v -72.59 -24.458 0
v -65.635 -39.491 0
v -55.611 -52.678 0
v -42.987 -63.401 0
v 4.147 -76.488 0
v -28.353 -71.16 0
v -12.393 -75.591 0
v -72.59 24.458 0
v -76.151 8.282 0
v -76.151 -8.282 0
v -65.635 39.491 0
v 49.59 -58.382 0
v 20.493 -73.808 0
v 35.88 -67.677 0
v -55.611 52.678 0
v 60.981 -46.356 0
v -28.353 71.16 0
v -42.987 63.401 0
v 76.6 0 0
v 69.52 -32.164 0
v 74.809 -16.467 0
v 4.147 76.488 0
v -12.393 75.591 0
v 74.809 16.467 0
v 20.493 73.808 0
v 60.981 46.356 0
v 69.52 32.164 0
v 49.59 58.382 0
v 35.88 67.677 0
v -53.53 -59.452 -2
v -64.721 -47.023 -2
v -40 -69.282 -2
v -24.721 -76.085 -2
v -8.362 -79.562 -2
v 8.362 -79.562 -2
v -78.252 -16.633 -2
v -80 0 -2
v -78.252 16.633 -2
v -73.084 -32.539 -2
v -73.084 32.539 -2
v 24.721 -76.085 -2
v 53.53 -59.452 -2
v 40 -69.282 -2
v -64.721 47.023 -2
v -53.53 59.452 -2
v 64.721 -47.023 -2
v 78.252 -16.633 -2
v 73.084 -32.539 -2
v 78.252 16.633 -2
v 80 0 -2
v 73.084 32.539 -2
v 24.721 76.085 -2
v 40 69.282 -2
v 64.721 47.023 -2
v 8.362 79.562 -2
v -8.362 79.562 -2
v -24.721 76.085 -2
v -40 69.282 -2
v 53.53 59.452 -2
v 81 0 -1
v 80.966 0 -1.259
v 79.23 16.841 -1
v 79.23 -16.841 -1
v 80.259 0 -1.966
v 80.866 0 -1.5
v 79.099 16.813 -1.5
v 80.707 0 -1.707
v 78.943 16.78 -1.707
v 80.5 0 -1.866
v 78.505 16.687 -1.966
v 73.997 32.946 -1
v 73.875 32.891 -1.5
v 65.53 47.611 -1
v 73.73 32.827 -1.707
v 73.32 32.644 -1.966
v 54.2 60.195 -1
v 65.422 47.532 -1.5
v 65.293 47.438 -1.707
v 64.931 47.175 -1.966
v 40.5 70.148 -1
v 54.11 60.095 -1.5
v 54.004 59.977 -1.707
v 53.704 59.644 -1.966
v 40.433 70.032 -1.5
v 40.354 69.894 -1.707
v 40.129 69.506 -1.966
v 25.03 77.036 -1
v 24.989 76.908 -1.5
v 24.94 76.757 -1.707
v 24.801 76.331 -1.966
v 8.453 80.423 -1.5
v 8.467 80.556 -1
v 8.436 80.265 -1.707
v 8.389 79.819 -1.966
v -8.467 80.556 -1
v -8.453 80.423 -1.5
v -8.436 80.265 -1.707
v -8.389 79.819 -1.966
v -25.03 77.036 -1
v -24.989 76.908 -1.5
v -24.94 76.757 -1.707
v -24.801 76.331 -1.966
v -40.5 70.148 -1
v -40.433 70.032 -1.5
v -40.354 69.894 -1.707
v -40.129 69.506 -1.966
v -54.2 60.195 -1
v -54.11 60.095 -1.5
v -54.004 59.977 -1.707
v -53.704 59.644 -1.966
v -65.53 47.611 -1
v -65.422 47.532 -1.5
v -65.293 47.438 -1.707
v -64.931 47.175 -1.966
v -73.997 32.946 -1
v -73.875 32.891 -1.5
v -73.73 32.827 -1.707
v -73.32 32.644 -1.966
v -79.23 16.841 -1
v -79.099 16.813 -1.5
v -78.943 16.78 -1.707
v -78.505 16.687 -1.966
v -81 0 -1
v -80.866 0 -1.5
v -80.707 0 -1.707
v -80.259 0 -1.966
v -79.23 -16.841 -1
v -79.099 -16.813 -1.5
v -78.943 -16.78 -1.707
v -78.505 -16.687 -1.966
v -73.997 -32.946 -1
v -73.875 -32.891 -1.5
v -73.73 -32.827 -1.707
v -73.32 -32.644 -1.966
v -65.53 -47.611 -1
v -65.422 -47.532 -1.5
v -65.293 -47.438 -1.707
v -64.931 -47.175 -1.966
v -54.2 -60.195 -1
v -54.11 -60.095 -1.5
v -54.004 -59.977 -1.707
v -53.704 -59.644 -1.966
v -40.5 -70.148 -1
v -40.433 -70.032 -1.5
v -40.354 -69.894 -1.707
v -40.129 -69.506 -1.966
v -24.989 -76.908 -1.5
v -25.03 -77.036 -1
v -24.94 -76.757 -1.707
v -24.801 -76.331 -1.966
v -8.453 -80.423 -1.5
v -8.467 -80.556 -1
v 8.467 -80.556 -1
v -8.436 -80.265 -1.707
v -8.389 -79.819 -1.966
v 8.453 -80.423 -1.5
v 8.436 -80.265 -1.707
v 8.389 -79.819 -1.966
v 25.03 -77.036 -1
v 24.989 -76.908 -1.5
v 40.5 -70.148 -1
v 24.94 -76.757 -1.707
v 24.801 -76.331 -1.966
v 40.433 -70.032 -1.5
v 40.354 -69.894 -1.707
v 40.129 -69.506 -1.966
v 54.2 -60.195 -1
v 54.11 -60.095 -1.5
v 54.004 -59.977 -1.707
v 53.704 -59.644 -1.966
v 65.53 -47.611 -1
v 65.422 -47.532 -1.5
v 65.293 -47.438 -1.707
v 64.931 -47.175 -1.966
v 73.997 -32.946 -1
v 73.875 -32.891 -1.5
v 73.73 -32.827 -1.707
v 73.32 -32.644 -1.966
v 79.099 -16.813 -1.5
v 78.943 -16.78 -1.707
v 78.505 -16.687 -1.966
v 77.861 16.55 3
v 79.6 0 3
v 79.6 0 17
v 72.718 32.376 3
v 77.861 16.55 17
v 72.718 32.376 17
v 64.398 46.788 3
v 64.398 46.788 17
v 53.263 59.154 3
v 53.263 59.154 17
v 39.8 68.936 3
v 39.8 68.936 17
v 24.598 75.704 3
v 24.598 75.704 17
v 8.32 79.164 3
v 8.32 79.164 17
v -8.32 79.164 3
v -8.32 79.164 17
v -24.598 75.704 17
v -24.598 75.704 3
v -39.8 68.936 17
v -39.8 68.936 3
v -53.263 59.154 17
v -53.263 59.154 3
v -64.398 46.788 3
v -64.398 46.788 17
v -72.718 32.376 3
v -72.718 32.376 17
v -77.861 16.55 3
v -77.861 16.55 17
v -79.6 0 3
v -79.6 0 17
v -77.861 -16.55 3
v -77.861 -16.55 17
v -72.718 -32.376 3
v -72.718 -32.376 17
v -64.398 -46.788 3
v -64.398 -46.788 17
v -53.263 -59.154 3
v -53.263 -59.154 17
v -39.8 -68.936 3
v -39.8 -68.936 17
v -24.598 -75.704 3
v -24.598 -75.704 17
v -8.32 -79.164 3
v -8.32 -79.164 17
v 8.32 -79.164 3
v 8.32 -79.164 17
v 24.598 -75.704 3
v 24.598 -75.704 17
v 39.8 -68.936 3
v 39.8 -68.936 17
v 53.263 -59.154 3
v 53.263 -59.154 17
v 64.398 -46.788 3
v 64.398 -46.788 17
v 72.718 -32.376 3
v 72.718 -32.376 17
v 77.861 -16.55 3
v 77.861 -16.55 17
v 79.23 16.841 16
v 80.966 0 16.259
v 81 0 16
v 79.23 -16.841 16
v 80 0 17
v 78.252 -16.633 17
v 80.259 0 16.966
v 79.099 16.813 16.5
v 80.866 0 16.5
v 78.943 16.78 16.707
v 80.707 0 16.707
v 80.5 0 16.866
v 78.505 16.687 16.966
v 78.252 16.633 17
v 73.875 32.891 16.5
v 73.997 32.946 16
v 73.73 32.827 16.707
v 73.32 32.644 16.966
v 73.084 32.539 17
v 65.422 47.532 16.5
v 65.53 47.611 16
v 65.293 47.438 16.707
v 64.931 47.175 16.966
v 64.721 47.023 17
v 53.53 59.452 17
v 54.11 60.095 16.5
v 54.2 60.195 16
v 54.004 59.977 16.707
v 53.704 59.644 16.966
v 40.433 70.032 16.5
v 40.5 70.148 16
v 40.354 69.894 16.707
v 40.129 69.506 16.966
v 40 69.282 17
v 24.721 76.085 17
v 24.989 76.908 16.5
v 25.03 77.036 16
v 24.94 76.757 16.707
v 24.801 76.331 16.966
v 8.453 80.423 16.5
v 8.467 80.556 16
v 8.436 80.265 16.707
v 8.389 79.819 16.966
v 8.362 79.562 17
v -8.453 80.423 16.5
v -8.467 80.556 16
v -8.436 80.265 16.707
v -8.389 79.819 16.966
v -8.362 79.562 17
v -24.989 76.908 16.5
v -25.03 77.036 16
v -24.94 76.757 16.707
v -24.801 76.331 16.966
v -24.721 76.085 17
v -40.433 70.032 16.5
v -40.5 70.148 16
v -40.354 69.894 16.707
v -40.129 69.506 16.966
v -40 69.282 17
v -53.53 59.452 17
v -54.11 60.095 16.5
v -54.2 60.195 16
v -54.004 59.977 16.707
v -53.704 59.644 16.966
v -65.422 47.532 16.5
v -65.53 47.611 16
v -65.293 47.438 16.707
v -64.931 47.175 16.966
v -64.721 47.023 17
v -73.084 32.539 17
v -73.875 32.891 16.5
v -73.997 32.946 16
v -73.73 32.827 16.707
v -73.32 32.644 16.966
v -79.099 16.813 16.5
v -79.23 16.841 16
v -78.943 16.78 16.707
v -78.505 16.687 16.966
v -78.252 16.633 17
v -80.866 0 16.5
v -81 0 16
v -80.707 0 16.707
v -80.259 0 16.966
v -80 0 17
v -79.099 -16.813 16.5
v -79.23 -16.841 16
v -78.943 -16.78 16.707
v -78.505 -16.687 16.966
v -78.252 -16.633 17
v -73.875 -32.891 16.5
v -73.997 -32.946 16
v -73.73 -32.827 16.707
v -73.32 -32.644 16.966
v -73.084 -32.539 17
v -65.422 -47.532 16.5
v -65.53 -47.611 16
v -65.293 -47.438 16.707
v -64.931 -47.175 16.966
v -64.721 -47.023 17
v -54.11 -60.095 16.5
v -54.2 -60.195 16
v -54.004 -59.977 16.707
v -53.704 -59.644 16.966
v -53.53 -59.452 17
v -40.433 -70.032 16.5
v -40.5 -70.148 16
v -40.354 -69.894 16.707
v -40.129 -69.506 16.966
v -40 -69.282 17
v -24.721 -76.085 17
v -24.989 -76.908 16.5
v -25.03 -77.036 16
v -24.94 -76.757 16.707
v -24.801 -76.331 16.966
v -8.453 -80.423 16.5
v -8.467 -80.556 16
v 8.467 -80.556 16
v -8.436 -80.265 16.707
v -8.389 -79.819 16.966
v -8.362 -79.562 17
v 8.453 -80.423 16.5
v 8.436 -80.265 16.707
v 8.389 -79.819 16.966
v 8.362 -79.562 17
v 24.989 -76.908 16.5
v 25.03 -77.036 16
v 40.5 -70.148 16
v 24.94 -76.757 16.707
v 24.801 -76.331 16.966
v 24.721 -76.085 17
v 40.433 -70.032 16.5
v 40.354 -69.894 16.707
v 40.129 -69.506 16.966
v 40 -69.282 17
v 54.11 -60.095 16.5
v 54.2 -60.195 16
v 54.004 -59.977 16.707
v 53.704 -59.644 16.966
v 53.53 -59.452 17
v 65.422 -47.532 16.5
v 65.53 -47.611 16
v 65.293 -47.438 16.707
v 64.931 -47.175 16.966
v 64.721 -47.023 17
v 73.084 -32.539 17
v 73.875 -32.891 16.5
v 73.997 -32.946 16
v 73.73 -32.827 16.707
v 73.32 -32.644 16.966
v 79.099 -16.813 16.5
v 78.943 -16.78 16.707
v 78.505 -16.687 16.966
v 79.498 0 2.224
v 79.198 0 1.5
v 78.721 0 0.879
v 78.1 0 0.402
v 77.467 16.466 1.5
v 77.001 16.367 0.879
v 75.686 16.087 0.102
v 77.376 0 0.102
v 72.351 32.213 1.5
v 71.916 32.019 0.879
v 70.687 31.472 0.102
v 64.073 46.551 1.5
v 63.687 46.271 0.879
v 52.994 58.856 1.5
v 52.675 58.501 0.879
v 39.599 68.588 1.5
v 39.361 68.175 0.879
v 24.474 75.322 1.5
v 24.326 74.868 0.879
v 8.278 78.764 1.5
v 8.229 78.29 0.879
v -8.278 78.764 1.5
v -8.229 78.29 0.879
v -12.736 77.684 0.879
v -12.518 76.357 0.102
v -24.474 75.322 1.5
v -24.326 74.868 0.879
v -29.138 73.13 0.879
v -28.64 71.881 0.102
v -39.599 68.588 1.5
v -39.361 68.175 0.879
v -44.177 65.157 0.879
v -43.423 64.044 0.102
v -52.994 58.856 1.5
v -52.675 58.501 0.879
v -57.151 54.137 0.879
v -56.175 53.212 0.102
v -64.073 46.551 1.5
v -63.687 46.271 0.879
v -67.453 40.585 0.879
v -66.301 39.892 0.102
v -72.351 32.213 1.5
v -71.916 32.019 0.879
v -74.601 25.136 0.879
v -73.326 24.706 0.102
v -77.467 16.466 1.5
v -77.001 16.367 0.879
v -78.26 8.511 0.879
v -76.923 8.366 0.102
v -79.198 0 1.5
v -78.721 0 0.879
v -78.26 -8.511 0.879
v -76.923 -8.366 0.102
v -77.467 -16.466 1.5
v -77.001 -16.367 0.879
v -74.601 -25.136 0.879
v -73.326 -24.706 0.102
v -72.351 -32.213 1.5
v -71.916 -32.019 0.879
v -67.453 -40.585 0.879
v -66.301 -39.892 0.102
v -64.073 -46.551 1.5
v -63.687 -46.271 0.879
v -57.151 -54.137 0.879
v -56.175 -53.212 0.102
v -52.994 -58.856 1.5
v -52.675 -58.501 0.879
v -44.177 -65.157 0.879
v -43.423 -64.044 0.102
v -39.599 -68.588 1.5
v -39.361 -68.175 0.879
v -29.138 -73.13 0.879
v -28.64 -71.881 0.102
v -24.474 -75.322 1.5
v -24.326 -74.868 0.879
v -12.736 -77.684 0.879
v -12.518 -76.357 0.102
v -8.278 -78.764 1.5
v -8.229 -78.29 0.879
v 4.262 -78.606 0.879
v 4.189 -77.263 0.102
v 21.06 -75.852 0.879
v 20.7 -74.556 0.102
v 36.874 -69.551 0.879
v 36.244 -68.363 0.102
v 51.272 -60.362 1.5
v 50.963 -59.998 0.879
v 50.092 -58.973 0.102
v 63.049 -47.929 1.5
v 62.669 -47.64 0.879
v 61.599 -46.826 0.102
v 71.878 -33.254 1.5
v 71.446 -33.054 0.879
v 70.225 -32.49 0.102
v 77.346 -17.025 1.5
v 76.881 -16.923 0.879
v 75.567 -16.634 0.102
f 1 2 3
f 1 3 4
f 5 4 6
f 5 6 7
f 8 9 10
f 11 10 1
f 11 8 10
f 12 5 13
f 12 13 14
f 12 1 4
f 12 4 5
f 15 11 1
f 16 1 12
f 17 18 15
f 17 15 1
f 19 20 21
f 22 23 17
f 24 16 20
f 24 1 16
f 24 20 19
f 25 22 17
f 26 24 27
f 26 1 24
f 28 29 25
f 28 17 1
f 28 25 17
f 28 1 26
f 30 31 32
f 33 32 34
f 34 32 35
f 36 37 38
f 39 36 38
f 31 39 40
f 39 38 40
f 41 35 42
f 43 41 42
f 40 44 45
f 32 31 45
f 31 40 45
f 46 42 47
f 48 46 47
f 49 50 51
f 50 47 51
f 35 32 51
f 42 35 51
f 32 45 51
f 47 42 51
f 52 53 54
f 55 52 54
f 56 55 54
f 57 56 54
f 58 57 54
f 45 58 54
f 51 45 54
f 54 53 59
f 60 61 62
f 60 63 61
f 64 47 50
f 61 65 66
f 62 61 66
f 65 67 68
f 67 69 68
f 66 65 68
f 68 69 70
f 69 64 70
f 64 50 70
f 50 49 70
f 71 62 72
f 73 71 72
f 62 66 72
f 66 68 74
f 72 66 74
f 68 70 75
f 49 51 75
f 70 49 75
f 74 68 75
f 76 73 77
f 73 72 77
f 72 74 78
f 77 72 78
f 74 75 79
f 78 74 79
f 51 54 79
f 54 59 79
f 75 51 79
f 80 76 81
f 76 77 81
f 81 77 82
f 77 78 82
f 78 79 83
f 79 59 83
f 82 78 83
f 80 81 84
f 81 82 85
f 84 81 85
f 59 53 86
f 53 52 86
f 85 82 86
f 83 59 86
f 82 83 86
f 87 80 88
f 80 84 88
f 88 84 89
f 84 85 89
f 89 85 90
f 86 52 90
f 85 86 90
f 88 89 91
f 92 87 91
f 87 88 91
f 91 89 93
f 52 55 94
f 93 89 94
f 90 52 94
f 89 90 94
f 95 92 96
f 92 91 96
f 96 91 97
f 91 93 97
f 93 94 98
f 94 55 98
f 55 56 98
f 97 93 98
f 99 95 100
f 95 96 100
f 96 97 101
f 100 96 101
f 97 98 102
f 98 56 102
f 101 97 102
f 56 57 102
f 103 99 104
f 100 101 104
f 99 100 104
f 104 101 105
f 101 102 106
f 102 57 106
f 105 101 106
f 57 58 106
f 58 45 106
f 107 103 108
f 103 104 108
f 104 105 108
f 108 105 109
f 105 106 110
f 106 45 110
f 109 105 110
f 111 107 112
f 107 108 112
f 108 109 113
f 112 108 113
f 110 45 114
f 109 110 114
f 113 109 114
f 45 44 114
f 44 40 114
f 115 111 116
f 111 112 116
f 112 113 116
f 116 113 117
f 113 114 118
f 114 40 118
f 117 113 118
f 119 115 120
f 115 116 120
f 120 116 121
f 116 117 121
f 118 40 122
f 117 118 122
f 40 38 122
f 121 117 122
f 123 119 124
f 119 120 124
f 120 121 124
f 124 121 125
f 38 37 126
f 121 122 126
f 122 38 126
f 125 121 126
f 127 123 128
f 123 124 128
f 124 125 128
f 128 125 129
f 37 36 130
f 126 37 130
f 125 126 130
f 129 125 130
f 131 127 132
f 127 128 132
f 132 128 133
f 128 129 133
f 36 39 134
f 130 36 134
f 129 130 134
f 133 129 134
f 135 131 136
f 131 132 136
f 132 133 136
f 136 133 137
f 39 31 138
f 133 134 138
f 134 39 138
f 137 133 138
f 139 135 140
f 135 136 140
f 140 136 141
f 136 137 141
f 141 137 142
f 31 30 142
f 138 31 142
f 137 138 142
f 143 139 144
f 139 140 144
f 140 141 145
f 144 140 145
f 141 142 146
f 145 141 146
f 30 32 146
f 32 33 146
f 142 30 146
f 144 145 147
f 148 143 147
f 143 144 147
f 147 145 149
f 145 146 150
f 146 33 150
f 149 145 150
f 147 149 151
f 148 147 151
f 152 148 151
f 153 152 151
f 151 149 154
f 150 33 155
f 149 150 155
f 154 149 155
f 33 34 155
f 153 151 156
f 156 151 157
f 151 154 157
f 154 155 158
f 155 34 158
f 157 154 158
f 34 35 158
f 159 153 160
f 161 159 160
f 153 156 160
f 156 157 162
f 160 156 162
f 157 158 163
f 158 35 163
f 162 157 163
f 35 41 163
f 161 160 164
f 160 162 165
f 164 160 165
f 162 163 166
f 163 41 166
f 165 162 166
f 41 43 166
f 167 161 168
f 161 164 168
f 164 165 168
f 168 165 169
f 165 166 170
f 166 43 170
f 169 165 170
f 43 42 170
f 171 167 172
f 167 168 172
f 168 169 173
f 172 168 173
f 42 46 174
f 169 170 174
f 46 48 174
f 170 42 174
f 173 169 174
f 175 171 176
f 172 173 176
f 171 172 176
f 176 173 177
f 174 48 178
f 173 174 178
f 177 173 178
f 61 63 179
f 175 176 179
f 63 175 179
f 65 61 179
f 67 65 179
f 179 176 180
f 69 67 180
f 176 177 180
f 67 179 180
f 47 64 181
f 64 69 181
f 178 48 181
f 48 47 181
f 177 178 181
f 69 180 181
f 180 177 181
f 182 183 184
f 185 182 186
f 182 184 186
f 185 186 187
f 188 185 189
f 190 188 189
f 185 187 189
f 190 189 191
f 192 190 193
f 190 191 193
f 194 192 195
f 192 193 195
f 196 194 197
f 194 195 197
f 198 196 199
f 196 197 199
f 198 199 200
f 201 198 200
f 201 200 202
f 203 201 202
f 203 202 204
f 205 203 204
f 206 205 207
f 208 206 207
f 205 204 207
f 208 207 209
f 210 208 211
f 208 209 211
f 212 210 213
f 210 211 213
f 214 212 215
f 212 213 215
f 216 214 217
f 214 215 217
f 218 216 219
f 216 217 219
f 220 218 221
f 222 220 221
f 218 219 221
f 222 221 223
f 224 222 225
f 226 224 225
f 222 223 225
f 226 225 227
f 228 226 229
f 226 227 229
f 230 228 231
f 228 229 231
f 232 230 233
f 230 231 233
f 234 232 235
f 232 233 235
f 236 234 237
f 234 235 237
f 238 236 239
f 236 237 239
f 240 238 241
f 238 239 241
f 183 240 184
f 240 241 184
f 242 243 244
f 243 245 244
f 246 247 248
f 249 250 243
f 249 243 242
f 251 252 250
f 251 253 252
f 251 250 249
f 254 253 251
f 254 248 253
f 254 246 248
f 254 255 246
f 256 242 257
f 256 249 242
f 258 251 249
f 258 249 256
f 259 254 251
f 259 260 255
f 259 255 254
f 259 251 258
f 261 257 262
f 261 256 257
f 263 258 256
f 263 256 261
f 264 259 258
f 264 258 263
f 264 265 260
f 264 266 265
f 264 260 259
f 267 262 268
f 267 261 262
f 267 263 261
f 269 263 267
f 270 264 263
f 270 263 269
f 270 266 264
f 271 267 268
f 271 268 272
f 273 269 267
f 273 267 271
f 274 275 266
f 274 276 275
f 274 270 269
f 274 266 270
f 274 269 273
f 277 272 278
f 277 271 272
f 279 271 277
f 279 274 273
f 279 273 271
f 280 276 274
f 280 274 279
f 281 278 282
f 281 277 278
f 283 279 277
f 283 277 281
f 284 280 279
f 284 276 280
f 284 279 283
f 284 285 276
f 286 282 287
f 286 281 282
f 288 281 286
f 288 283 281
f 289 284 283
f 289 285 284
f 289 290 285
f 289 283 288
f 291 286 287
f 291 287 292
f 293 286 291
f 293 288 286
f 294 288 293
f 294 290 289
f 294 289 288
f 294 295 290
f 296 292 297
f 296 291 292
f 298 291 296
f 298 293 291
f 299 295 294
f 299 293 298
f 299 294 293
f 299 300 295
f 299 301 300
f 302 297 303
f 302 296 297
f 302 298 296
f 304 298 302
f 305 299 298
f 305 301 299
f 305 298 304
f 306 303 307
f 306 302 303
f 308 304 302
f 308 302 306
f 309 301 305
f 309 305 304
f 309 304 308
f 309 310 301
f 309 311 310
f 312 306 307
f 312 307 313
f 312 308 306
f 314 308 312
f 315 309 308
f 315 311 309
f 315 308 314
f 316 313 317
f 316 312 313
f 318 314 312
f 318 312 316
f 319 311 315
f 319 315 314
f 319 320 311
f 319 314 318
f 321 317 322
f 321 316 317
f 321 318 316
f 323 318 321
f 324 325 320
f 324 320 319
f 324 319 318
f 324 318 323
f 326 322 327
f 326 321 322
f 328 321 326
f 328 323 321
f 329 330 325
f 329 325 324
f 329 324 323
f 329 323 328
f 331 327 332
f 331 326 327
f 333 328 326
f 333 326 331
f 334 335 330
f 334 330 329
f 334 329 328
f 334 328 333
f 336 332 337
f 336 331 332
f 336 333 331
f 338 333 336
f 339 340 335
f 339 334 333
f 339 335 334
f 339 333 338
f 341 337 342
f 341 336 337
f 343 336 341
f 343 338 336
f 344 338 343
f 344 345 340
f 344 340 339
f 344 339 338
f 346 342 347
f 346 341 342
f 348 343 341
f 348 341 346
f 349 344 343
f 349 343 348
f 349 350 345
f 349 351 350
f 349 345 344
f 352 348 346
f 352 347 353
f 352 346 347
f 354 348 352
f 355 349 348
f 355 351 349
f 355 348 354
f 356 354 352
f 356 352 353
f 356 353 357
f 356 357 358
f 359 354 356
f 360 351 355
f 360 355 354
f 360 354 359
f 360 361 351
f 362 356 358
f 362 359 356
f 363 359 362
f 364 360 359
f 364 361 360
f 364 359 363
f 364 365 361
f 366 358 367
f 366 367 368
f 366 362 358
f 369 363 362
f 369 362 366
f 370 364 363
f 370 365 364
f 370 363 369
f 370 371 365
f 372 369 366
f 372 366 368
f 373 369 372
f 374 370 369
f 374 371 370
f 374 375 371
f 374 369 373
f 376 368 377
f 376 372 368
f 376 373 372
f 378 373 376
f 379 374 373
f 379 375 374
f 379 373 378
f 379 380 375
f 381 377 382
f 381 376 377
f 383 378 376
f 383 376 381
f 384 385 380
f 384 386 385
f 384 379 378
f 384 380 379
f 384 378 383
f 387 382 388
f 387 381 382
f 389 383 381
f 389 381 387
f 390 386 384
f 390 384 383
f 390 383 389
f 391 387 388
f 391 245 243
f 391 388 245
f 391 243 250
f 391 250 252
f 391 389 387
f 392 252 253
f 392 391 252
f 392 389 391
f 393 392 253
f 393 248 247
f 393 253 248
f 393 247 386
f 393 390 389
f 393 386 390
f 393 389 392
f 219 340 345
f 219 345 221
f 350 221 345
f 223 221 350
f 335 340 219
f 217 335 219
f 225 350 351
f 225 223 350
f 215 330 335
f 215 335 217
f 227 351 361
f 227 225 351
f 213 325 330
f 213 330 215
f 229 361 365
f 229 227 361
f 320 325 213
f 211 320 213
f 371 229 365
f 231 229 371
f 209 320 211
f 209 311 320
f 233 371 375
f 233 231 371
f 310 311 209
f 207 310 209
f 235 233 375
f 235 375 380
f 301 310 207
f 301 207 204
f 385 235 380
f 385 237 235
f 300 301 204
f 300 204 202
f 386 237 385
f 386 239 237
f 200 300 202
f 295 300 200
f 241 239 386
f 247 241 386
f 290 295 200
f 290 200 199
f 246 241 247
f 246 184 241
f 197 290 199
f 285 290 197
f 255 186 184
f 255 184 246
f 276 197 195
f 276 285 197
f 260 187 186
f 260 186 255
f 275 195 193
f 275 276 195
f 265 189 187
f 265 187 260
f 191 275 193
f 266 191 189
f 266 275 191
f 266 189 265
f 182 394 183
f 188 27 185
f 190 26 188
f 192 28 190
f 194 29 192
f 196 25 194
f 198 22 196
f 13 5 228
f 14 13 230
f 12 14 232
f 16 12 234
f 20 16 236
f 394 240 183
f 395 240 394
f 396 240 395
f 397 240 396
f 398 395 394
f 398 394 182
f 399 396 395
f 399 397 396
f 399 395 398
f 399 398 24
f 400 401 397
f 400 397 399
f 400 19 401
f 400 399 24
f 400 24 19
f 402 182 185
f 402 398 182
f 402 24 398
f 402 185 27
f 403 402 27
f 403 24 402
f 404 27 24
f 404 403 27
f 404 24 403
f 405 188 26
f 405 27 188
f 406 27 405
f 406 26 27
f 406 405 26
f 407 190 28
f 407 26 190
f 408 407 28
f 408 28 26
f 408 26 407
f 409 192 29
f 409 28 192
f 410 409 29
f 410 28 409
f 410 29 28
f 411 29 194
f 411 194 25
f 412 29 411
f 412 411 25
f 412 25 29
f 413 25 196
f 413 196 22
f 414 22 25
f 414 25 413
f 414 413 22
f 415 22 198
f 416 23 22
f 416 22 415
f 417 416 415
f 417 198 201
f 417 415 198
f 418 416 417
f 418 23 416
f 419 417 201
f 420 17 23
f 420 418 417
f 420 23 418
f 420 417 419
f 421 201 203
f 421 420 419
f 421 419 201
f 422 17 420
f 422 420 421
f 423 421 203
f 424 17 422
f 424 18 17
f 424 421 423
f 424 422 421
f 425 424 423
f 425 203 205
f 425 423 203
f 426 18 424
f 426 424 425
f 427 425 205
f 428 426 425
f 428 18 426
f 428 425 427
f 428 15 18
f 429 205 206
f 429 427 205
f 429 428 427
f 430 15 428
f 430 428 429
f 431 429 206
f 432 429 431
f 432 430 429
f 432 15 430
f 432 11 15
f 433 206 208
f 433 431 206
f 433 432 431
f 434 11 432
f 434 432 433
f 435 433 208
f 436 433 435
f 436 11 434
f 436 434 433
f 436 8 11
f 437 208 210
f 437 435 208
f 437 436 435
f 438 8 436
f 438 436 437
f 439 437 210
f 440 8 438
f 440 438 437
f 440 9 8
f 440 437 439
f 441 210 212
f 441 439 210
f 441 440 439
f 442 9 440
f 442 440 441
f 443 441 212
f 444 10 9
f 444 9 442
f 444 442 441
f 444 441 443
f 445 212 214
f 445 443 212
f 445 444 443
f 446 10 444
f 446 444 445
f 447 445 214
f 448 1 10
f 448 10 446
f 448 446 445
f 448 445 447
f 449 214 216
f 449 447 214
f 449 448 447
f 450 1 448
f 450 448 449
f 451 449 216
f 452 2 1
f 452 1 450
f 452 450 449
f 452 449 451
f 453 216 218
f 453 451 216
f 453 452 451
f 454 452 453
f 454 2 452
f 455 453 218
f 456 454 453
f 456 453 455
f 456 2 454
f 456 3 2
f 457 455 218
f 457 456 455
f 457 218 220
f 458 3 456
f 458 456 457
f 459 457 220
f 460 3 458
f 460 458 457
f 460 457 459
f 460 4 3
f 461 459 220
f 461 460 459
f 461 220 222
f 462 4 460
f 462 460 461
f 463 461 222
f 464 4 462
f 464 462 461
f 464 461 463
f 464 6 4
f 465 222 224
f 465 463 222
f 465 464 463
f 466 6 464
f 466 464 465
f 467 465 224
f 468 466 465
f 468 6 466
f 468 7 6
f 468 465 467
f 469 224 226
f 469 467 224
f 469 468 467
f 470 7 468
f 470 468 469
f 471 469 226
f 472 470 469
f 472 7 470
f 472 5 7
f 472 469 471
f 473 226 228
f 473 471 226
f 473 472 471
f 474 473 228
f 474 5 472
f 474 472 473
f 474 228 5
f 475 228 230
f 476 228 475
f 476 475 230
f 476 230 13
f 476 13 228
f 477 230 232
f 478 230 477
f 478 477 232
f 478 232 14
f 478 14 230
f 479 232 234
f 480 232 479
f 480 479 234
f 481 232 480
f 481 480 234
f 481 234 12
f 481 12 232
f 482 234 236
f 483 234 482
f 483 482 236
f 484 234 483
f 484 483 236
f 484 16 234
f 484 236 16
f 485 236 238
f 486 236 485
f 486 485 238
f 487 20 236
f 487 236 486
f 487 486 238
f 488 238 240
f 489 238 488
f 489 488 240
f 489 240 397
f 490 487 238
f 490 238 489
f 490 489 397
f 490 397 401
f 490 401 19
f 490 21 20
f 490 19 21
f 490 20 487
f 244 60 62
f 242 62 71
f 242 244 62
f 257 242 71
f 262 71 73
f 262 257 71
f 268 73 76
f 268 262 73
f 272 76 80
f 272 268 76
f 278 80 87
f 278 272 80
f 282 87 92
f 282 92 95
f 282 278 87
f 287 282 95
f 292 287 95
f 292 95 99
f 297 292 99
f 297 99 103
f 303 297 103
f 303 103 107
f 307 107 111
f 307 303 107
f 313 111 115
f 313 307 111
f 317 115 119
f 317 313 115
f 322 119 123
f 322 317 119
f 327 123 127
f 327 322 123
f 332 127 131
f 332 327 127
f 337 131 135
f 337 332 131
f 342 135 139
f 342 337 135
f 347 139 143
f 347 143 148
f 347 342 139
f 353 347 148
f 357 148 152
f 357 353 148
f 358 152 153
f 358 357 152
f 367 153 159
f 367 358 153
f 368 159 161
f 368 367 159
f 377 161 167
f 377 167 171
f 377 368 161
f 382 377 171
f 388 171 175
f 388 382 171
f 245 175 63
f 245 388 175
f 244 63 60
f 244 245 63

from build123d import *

# Parameters (mm, degrees)
SKETCH1_R           = 81
BOSS_EXTRUDE1_DEPTH = 2
BOSS_EXTRUDE2_START = 17
SKETCH1_3_R         = 81
SKETCH1_3_R_2       = 79.6
BOSS_EXTRUDE2_DEPTH = 17
FILLET3_R           = 1
FILLET4_R           = 1
FILLET5_R           = 3


with BuildPart() as part:
    # Sketch1 → Boss-Extrude1 (new body)
    with BuildSketch(Plane.XY):
        Circle(SKETCH1_R)
    extrude(amount=-BOSS_EXTRUDE1_DEPTH)

    # Sketch1<3> → Boss-Extrude2 (add)
    with BuildSketch(Plane.XY.offset(BOSS_EXTRUDE2_START)):
        Circle(SKETCH1_3_R)
        Circle(SKETCH1_3_R_2, mode=Mode.SUBTRACT)
    extrude(amount=-BOSS_EXTRUDE2_DEPTH)

    # Fillet3
    fillet3_edges = [part.edges().sort_by_distance(p)[0] for p in [
        (-81, 0, -2),
    ]]
    fillet(fillet3_edges, radius=FILLET3_R)

    # Fillet4
    fillet4_edges = [part.edges().sort_by_distance(p)[0] for p in [
        (-81, 0, 17),
    ]]
    fillet(fillet4_edges, radius=FILLET4_R)

    # Fillet5
    fillet5_edges = [part.edges().sort_by_distance(p)[0] for p in [
        (-79.6, 0, 0),
    ]]
    fillet(fillet5_edges, radius=FILLET5_R)


solid = part.part
